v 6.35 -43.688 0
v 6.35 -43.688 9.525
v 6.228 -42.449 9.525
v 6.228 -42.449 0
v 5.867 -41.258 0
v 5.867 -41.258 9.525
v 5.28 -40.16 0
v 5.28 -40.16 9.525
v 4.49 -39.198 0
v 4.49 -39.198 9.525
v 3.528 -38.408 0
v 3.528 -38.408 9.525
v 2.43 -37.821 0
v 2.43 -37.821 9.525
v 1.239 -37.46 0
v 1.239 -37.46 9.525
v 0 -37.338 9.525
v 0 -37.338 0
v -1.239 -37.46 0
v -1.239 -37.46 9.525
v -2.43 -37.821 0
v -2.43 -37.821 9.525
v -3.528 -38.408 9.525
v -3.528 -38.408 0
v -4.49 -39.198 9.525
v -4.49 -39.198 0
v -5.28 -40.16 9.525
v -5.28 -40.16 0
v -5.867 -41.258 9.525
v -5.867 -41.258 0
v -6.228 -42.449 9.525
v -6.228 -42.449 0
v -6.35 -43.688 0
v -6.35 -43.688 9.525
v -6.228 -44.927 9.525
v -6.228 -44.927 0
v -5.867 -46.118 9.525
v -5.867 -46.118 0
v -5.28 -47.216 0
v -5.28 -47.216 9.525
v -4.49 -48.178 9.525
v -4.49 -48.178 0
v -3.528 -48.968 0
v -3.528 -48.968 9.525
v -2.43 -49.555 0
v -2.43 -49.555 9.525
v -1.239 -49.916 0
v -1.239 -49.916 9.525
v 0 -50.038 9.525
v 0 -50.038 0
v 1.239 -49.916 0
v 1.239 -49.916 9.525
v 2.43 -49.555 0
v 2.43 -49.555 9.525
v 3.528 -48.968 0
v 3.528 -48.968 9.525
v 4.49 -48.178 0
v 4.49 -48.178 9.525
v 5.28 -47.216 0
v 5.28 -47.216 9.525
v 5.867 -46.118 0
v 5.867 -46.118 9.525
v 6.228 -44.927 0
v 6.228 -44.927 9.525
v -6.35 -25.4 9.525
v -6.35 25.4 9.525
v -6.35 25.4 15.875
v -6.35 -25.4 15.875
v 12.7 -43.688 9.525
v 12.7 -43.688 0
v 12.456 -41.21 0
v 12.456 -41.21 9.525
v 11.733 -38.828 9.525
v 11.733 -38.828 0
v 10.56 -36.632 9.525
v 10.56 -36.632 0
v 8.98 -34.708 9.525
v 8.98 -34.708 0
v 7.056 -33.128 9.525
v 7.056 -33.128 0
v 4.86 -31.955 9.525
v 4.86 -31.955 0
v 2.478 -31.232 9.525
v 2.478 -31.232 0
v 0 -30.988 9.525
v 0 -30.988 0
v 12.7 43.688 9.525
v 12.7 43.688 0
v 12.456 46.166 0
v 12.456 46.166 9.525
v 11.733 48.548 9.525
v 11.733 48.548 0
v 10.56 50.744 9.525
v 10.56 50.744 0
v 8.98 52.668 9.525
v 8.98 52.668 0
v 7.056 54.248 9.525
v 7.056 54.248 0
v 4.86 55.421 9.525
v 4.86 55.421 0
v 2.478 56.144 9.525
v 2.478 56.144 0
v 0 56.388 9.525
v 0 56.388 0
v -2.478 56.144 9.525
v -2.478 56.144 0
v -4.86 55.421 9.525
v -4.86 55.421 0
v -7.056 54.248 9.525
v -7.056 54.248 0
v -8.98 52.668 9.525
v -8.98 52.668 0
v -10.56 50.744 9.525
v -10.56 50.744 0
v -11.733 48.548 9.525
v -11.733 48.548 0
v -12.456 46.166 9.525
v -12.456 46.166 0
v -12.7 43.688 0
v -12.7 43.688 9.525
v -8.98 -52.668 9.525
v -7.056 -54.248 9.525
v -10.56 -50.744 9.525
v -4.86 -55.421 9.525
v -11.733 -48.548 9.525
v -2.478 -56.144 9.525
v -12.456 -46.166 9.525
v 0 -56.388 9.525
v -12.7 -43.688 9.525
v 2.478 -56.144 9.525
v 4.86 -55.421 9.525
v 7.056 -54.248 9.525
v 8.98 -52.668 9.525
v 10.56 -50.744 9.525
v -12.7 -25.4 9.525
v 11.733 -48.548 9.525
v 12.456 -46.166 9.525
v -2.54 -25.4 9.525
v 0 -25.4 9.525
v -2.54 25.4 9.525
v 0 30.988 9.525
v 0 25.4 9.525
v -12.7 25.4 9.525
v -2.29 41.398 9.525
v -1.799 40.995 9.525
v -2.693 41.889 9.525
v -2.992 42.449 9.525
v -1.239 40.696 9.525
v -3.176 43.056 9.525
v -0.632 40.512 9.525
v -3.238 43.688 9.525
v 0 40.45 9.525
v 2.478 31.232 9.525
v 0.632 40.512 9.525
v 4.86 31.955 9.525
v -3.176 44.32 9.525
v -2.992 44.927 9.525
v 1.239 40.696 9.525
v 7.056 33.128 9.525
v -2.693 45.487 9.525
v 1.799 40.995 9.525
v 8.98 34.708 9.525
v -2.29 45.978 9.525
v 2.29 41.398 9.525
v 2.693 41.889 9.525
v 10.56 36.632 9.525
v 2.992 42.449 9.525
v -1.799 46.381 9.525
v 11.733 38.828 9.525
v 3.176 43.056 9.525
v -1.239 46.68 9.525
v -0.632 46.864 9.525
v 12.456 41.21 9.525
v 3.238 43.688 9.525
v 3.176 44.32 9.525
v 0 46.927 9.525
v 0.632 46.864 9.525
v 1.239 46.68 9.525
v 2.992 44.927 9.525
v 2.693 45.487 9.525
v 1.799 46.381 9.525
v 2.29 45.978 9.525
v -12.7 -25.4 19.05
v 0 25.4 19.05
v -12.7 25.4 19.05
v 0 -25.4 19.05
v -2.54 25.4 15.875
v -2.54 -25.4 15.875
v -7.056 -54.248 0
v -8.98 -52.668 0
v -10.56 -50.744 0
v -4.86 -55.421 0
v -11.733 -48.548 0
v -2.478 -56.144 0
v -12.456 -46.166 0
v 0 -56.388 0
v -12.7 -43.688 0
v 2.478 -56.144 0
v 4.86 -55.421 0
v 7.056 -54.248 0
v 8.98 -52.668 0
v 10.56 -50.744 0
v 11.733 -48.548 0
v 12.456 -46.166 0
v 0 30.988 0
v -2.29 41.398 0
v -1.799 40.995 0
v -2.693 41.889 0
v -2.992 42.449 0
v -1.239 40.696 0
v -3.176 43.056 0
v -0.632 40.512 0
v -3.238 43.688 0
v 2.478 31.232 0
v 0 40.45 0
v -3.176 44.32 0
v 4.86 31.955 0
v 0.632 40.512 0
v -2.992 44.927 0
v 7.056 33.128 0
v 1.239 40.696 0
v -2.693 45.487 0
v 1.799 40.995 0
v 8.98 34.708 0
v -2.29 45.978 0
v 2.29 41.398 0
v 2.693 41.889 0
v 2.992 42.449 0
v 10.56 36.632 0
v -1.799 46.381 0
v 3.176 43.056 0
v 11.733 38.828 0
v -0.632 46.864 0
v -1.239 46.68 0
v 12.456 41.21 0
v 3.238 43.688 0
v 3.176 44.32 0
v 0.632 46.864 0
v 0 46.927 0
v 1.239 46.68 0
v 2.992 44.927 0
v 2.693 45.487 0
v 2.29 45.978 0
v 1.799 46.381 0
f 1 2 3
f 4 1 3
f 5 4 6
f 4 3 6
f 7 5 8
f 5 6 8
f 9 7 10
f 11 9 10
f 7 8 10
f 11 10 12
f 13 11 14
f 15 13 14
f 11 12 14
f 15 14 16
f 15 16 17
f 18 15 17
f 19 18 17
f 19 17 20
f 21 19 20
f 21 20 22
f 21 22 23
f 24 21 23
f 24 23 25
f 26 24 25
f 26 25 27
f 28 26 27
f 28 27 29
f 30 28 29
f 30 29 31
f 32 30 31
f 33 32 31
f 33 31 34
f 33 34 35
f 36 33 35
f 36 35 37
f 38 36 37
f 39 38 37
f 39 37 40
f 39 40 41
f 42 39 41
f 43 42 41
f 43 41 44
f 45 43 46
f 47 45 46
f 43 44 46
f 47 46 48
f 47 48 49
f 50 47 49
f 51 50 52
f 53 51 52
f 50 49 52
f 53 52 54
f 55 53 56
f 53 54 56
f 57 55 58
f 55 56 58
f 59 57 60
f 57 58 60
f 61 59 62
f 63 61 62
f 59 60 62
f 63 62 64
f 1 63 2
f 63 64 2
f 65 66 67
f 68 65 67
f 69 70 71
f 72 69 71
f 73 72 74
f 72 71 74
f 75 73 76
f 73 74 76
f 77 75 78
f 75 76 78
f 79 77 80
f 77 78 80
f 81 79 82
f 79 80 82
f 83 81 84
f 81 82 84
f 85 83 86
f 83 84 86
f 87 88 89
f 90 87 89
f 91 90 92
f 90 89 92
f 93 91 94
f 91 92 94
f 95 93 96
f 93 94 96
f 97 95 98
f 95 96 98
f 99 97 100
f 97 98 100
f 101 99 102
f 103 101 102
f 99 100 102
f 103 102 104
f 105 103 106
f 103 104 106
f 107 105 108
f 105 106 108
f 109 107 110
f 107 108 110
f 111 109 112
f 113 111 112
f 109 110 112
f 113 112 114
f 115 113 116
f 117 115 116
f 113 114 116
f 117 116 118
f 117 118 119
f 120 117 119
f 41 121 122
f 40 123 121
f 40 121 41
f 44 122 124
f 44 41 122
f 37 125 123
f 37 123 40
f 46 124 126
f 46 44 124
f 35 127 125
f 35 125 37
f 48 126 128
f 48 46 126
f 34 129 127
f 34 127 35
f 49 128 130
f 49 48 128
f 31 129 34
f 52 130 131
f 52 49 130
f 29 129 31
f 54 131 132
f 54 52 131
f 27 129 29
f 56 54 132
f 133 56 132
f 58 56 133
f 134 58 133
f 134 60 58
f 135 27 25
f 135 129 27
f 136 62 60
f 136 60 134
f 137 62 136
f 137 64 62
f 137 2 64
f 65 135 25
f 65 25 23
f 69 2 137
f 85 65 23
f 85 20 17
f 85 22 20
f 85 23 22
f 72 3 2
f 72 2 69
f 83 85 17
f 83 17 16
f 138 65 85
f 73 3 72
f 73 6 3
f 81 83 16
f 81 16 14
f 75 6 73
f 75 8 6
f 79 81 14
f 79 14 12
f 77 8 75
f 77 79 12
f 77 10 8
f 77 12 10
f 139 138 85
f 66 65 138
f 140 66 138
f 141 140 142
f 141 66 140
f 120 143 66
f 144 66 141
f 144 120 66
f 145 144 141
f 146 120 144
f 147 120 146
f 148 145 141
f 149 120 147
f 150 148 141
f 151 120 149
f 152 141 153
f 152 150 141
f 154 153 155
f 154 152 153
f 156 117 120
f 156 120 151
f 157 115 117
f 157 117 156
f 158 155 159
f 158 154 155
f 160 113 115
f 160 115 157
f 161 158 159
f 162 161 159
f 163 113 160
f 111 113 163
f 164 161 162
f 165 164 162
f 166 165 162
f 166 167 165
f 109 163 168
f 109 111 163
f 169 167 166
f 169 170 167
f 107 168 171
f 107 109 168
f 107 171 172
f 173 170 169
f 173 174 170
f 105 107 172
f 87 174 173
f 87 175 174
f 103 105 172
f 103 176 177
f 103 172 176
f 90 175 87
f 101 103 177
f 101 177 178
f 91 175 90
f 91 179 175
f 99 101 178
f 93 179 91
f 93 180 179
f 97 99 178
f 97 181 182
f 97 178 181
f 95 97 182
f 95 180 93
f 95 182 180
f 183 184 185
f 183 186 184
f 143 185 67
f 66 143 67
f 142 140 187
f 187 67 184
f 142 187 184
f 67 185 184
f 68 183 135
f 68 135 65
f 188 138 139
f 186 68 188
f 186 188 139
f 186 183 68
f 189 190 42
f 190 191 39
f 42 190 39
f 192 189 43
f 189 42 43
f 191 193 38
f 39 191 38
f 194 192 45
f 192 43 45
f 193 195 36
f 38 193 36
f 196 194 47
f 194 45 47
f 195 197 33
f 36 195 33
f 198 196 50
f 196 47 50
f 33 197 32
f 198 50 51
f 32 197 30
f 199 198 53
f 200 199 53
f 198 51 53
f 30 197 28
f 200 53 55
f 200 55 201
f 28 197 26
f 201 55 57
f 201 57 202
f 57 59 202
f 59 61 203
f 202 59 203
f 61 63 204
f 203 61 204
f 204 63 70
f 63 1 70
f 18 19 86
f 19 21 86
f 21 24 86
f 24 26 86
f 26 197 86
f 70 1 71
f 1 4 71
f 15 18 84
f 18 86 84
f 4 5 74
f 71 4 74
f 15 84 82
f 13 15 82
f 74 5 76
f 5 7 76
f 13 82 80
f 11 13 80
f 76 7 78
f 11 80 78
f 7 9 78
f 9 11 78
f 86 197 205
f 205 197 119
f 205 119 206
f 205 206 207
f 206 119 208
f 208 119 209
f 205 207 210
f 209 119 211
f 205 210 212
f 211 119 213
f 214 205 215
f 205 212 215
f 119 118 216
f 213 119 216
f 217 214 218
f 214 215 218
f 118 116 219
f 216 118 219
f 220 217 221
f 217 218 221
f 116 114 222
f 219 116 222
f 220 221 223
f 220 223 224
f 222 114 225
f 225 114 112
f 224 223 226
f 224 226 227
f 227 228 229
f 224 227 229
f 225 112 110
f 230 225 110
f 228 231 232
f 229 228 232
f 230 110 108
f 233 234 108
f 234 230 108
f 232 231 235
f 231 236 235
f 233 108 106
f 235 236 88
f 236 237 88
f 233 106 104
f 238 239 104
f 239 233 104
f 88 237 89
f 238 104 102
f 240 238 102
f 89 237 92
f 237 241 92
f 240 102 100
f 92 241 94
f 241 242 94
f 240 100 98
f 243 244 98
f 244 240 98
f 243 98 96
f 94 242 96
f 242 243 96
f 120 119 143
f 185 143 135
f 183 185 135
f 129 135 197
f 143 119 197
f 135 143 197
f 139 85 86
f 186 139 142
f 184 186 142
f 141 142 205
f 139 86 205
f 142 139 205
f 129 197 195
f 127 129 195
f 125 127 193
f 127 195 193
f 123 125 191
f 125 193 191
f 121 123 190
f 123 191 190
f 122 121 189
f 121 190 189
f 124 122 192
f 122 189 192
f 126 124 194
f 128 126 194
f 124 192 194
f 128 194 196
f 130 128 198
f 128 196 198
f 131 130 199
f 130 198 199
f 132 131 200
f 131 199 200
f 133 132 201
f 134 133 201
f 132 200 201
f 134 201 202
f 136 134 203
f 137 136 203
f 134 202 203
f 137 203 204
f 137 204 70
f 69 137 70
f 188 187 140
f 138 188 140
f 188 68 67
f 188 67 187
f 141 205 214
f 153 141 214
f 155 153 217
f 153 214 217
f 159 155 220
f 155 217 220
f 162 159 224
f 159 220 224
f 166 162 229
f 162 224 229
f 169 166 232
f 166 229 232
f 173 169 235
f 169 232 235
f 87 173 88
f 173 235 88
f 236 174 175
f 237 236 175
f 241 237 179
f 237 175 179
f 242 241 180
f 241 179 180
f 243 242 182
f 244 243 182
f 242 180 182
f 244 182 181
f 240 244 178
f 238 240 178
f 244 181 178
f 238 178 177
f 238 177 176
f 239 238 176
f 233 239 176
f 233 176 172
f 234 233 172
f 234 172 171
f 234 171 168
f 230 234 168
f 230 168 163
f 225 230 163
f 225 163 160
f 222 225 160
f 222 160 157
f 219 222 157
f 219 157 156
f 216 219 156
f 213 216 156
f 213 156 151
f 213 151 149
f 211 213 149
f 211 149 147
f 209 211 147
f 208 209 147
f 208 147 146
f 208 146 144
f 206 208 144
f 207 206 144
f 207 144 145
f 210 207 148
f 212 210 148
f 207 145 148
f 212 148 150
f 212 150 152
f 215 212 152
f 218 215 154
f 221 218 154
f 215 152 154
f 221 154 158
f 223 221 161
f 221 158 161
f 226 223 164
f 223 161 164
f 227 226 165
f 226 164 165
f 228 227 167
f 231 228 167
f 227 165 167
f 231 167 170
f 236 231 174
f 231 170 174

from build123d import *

# Parameters (mm, degrees)
F1_DEPTH = 9.525
F2_R     = 6.35
F2_R_2   = 3.2385
F3_DEPTH = 25.4
F5_DEPTH = 25.4


with BuildPart() as f1:
    # F0 (on Top) → F1 (new body)
    with BuildSketch(Plane.XY):
        with BuildLine():
            ThreePointArc((0, -30.988), (-8.980256, -34.707744), (-12.7, -43.688))
            ThreePointArc((-12.7, -43.688), (0, -56.388), (12.7, -43.688))
            ThreePointArc((12.7, -43.688), (8.980256, -34.707744), (0, -30.988))
        make_face()
        with BuildLine():
            ThreePointArc((0, 30.988), (-8.980256, 34.707744), (-12.7, 43.688))
            Line((-12.7, 43.688), (-12.7, -43.688))
            ThreePointArc((-12.7, -43.688), (-8.980256, -34.707744), (0, -30.988))
            Line((0, -30.988), (0, 30.988))
        make_face()
        with BuildLine():
            ThreePointArc((0, 30.988), (8.980256, 34.707744), (12.7, 43.688))
            ThreePointArc((12.7, 43.688), (0, 56.388), (-12.7, 43.688))
            ThreePointArc((-12.7, 43.688), (-8.980256, 34.707744), (0, 30.988))
        make_face()
    extrude(amount=F1_DEPTH)

    # F2 (on face) → F3 (cut)
    with BuildSketch(Plane.XY.offset(9.525)):
        with Locations((0, -43.688)):
            Circle(F2_R)
        with Locations((0, 43.688)):
            Circle(F2_R_2)
    extrude(amount=-F3_DEPTH, mode=Mode.SUBTRACT)

    # F4 (on Front) → F5 (join, symmetric)
    with BuildSketch(Plane.XZ):
        Polygon((0, 19.05), (-12.7, 19.05), (-12.7, 9.525), (-6.35, 9.525), (-6.35, 15.875), (-2.54, 15.875), (-2.54, 9.525), (0, 9.525), align=None)
    extrude(amount=F5_DEPTH, both=True)


solid = f1.part
